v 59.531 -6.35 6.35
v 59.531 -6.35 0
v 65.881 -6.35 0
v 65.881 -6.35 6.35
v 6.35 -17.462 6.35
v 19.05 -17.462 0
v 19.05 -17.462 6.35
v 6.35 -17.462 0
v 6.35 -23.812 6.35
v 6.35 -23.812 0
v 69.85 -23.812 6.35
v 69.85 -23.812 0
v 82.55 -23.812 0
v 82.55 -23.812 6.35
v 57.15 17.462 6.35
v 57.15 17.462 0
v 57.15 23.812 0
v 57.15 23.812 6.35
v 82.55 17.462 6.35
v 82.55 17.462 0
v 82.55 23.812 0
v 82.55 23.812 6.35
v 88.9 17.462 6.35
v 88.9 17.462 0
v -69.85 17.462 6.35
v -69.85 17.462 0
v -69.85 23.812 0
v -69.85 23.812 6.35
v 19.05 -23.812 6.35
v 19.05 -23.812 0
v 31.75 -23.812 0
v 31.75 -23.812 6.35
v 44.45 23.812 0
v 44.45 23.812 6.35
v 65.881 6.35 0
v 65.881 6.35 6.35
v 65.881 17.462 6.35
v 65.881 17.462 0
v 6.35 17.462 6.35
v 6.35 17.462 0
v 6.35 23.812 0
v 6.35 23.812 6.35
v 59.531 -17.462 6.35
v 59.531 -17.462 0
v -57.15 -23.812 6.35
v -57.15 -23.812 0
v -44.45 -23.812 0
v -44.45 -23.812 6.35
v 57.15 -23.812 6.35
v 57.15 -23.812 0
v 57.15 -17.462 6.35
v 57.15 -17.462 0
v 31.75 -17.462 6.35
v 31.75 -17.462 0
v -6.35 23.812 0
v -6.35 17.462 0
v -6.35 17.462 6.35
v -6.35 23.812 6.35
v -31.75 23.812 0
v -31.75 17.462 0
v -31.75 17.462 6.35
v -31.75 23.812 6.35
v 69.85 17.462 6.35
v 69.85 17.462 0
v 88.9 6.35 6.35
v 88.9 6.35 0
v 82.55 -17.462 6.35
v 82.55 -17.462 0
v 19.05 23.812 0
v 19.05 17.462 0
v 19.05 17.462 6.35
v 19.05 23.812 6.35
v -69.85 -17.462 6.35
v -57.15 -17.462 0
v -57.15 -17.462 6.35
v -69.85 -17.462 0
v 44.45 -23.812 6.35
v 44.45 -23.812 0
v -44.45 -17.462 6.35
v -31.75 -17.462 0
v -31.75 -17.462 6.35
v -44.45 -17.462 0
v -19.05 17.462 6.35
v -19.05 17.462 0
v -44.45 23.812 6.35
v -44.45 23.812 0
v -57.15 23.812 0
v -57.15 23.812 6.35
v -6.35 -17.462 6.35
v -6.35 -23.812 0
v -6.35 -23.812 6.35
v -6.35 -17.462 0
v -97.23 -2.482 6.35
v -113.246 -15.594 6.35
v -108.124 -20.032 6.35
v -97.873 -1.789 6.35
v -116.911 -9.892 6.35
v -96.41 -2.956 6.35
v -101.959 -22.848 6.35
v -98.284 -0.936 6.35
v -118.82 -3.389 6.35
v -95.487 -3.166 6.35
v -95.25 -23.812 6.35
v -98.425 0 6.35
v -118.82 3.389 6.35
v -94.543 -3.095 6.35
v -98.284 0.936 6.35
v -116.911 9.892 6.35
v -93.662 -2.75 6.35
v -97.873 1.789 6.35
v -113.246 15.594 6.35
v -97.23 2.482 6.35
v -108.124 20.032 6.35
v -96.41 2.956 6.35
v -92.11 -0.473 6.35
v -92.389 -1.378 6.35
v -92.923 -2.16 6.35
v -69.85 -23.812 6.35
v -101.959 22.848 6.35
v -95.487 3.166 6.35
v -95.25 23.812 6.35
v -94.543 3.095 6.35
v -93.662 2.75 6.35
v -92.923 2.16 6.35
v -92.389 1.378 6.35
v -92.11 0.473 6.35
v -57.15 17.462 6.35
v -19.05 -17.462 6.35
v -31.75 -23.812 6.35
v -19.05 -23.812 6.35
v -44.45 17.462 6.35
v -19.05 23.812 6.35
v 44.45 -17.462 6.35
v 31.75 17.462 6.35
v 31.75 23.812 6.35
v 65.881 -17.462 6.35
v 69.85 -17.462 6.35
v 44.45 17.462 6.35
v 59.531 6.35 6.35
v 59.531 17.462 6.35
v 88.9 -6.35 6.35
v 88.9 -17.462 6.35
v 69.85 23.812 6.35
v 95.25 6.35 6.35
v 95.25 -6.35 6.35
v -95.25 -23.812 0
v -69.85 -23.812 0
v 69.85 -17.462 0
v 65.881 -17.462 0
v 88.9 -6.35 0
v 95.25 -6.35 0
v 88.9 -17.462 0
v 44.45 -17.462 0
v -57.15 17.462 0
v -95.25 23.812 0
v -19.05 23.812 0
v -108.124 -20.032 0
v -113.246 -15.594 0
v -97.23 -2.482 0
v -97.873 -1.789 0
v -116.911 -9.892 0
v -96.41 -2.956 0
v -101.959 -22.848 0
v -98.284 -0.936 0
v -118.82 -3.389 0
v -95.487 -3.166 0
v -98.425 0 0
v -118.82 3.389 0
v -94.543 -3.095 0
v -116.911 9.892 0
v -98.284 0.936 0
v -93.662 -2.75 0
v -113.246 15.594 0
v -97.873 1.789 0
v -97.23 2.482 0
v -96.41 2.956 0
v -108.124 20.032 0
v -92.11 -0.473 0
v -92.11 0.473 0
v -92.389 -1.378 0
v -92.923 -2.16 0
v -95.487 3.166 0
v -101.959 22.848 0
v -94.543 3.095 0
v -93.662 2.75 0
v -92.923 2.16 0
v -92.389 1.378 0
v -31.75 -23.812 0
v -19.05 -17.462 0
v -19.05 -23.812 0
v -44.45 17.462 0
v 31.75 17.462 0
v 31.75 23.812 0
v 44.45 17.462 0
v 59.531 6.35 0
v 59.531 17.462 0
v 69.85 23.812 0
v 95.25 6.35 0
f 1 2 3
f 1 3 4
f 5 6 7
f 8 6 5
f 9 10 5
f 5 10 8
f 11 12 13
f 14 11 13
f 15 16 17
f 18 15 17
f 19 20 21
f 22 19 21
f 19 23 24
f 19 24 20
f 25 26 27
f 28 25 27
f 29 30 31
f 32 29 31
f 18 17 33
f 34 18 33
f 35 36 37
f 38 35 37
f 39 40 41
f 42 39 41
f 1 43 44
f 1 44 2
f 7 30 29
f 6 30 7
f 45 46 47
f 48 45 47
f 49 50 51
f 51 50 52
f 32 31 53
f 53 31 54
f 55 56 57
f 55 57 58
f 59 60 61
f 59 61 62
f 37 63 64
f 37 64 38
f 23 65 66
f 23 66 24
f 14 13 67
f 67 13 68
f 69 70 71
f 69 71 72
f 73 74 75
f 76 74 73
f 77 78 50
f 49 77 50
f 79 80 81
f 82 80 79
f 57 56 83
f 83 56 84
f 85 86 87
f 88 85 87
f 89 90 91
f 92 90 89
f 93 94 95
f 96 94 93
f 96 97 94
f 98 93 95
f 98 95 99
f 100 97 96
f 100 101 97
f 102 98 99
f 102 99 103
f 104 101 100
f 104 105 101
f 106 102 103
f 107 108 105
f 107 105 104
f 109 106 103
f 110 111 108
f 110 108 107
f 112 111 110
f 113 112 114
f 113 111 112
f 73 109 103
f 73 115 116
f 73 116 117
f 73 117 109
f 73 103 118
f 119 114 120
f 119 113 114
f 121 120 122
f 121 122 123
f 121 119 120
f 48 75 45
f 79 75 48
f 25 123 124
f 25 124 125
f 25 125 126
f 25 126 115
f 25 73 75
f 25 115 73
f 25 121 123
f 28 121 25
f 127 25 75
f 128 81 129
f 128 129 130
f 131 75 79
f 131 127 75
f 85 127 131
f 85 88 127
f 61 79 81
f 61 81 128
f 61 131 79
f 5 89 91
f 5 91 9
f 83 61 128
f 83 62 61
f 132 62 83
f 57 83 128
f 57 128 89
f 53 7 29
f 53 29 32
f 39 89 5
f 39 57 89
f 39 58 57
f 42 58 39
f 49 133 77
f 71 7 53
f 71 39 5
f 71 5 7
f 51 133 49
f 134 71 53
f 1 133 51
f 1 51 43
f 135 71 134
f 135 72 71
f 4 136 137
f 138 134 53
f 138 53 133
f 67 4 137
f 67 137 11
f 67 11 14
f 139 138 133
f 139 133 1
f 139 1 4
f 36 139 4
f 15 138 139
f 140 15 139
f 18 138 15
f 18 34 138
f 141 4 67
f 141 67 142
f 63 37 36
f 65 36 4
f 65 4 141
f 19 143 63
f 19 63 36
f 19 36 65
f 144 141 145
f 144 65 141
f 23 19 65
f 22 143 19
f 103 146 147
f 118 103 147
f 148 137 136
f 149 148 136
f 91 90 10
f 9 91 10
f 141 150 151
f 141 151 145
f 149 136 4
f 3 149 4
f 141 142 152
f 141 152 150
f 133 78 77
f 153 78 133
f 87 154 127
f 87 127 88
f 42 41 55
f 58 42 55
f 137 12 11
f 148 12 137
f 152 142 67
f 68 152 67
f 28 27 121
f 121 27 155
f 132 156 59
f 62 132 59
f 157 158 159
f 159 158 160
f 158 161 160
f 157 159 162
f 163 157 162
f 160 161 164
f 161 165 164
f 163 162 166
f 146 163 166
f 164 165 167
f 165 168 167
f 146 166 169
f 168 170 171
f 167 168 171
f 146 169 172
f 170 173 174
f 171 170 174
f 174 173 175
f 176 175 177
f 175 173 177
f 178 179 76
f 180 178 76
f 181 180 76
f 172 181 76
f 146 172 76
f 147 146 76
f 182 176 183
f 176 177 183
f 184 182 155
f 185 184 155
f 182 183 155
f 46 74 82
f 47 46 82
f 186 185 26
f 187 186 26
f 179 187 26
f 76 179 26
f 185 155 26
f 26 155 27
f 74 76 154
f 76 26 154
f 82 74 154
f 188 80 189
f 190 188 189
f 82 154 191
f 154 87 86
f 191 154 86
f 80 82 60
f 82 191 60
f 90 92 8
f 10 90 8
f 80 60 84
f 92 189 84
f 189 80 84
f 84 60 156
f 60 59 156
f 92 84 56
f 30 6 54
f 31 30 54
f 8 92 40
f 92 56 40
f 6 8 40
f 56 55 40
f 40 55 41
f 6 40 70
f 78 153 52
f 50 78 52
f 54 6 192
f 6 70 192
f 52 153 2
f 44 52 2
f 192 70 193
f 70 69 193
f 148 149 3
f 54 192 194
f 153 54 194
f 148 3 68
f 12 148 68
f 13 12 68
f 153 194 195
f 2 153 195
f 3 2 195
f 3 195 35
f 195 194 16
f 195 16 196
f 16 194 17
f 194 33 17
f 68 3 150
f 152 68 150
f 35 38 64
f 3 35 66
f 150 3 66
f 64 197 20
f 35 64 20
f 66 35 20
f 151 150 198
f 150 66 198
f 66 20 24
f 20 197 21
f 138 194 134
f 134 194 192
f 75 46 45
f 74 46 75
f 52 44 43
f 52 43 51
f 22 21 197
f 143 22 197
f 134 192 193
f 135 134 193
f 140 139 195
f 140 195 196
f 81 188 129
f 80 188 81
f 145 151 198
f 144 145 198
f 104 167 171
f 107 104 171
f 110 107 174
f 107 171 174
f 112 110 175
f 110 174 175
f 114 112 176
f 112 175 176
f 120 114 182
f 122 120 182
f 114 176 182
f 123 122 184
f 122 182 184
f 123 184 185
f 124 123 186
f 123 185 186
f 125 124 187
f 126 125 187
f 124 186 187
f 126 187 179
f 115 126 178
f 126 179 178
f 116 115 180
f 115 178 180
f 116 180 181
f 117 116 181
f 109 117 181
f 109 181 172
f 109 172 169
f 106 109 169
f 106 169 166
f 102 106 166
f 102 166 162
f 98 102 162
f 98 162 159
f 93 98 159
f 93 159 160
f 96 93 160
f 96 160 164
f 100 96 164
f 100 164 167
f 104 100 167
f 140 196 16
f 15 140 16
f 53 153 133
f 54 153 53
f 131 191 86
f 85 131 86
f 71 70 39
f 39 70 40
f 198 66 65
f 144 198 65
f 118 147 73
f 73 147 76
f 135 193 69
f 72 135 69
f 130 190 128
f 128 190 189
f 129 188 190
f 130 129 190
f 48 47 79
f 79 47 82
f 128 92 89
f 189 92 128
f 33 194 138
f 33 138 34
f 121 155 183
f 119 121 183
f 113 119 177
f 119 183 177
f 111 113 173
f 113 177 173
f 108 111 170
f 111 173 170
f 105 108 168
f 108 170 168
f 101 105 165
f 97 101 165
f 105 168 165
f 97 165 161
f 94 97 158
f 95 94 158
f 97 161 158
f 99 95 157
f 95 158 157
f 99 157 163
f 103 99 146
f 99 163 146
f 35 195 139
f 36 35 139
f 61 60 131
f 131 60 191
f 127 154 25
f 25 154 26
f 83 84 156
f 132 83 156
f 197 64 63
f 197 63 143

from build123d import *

# Parameters (mm, degrees)
MASS_DEPTH          = 6.35
SKETCH4_R           = 3.175
CUT_EXTRUDE1_DEPTH  = 122.586333782
SKETCH3_W           = 12.7
SKETCH3_H           = 12.7
CUT_EXTRUDE2_DEPTH  = 122.586333782
LPATTERN1_COUNT     = 7
LPATTERN1_PITCH     = 25.4
CAVITY1_START       = 59.53125
CAVITY1_OUTLINE_W   = 11.1125
CAVITY1_OUTLINE_H   = 6.35
CAVITY1_DEPTH       = 6.35
CAVITY1_START_2     = 88.9
CAVITY1_2_OUTLINE_W = 11.1125
CAVITY1_2_OUTLINE_H = 6.35
CAVITY1_2_DEPTH     = 6.35


# Read off the part's stored shape, not the designer's step: Cavity1
with BuildPart() as part:
    # Sketch1 → Mass (new body)
    with BuildSketch(Plane.XY):
        with BuildLine():
            Line((-95.25, -23.8125), (95.25, -23.8125))
            Line((95.25, -23.8125), (95.25, 23.8125))
            Line((95.25, 23.8125), (-95.25, 23.8125))
            ThreePointArc((-95.25, 23.8125), (-119.0625, 0), (-95.25, -23.8125))
        make_face()
    extrude(amount=MASS_DEPTH)

    # Sketch4 → Cut-Extrude1 (cut, through all)
    with BuildSketch(Plane(origin=(0, 0, 0), x_dir=(-1, 0, 0), z_dir=(0, 0, -1))):
        with Locations((95.25, 0)):
            Circle(SKETCH4_R)
    extrude(amount=-CUT_EXTRUDE1_DEPTH, mode=Mode.SUBTRACT)

    # Sketch3 → Cut-Extrude2 (cut, through all)
    with BuildSketch(Plane(origin=(0, 0, 0), x_dir=(-1, 0, 0), z_dir=(0, 0, -1))):
        with Locations((-88.9, 23.8125)):
            Rectangle(SKETCH3_W, SKETCH3_H)
        with Locations((-88.9, -23.8125)):
            Rectangle(SKETCH3_W, SKETCH3_H)
    cut_extrude2 = extrude(amount=-CUT_EXTRUDE2_DEPTH, mode=Mode.SUBTRACT)

    # LPattern1: Cut-Extrude2 ×7
    with Locations(*[(-i * LPATTERN1_PITCH, 0, 0) for i in range(1, LPATTERN1_COUNT)]):
        add(cut_extrude2, mode=Mode.SUBTRACT)

    # Cavity1 outline → Cavity1 (cut)
    with BuildSketch(Plane.YZ.offset(CAVITY1_START)):
        with Locations((-11.90625, 3.175)):
            Rectangle(CAVITY1_OUTLINE_W, CAVITY1_OUTLINE_H)
        with Locations((11.90625, 3.175)):
            Rectangle(CAVITY1_OUTLINE_W, CAVITY1_OUTLINE_H)
    extrude(amount=CAVITY1_DEPTH, mode=Mode.SUBTRACT)

    # Cavity1 2 outline → Cavity1 2 (cut)
    with BuildSketch(Plane.YZ.offset(CAVITY1_START_2)):
        with Locations((-11.90625, 3.175)):
            Rectangle(CAVITY1_2_OUTLINE_W, CAVITY1_2_OUTLINE_H)
        with Locations((11.90625, 3.175)):
            Rectangle(CAVITY1_2_OUTLINE_W, CAVITY1_2_OUTLINE_H)
    extrude(amount=CAVITY1_2_DEPTH, mode=Mode.SUBTRACT)


solid = part.part
